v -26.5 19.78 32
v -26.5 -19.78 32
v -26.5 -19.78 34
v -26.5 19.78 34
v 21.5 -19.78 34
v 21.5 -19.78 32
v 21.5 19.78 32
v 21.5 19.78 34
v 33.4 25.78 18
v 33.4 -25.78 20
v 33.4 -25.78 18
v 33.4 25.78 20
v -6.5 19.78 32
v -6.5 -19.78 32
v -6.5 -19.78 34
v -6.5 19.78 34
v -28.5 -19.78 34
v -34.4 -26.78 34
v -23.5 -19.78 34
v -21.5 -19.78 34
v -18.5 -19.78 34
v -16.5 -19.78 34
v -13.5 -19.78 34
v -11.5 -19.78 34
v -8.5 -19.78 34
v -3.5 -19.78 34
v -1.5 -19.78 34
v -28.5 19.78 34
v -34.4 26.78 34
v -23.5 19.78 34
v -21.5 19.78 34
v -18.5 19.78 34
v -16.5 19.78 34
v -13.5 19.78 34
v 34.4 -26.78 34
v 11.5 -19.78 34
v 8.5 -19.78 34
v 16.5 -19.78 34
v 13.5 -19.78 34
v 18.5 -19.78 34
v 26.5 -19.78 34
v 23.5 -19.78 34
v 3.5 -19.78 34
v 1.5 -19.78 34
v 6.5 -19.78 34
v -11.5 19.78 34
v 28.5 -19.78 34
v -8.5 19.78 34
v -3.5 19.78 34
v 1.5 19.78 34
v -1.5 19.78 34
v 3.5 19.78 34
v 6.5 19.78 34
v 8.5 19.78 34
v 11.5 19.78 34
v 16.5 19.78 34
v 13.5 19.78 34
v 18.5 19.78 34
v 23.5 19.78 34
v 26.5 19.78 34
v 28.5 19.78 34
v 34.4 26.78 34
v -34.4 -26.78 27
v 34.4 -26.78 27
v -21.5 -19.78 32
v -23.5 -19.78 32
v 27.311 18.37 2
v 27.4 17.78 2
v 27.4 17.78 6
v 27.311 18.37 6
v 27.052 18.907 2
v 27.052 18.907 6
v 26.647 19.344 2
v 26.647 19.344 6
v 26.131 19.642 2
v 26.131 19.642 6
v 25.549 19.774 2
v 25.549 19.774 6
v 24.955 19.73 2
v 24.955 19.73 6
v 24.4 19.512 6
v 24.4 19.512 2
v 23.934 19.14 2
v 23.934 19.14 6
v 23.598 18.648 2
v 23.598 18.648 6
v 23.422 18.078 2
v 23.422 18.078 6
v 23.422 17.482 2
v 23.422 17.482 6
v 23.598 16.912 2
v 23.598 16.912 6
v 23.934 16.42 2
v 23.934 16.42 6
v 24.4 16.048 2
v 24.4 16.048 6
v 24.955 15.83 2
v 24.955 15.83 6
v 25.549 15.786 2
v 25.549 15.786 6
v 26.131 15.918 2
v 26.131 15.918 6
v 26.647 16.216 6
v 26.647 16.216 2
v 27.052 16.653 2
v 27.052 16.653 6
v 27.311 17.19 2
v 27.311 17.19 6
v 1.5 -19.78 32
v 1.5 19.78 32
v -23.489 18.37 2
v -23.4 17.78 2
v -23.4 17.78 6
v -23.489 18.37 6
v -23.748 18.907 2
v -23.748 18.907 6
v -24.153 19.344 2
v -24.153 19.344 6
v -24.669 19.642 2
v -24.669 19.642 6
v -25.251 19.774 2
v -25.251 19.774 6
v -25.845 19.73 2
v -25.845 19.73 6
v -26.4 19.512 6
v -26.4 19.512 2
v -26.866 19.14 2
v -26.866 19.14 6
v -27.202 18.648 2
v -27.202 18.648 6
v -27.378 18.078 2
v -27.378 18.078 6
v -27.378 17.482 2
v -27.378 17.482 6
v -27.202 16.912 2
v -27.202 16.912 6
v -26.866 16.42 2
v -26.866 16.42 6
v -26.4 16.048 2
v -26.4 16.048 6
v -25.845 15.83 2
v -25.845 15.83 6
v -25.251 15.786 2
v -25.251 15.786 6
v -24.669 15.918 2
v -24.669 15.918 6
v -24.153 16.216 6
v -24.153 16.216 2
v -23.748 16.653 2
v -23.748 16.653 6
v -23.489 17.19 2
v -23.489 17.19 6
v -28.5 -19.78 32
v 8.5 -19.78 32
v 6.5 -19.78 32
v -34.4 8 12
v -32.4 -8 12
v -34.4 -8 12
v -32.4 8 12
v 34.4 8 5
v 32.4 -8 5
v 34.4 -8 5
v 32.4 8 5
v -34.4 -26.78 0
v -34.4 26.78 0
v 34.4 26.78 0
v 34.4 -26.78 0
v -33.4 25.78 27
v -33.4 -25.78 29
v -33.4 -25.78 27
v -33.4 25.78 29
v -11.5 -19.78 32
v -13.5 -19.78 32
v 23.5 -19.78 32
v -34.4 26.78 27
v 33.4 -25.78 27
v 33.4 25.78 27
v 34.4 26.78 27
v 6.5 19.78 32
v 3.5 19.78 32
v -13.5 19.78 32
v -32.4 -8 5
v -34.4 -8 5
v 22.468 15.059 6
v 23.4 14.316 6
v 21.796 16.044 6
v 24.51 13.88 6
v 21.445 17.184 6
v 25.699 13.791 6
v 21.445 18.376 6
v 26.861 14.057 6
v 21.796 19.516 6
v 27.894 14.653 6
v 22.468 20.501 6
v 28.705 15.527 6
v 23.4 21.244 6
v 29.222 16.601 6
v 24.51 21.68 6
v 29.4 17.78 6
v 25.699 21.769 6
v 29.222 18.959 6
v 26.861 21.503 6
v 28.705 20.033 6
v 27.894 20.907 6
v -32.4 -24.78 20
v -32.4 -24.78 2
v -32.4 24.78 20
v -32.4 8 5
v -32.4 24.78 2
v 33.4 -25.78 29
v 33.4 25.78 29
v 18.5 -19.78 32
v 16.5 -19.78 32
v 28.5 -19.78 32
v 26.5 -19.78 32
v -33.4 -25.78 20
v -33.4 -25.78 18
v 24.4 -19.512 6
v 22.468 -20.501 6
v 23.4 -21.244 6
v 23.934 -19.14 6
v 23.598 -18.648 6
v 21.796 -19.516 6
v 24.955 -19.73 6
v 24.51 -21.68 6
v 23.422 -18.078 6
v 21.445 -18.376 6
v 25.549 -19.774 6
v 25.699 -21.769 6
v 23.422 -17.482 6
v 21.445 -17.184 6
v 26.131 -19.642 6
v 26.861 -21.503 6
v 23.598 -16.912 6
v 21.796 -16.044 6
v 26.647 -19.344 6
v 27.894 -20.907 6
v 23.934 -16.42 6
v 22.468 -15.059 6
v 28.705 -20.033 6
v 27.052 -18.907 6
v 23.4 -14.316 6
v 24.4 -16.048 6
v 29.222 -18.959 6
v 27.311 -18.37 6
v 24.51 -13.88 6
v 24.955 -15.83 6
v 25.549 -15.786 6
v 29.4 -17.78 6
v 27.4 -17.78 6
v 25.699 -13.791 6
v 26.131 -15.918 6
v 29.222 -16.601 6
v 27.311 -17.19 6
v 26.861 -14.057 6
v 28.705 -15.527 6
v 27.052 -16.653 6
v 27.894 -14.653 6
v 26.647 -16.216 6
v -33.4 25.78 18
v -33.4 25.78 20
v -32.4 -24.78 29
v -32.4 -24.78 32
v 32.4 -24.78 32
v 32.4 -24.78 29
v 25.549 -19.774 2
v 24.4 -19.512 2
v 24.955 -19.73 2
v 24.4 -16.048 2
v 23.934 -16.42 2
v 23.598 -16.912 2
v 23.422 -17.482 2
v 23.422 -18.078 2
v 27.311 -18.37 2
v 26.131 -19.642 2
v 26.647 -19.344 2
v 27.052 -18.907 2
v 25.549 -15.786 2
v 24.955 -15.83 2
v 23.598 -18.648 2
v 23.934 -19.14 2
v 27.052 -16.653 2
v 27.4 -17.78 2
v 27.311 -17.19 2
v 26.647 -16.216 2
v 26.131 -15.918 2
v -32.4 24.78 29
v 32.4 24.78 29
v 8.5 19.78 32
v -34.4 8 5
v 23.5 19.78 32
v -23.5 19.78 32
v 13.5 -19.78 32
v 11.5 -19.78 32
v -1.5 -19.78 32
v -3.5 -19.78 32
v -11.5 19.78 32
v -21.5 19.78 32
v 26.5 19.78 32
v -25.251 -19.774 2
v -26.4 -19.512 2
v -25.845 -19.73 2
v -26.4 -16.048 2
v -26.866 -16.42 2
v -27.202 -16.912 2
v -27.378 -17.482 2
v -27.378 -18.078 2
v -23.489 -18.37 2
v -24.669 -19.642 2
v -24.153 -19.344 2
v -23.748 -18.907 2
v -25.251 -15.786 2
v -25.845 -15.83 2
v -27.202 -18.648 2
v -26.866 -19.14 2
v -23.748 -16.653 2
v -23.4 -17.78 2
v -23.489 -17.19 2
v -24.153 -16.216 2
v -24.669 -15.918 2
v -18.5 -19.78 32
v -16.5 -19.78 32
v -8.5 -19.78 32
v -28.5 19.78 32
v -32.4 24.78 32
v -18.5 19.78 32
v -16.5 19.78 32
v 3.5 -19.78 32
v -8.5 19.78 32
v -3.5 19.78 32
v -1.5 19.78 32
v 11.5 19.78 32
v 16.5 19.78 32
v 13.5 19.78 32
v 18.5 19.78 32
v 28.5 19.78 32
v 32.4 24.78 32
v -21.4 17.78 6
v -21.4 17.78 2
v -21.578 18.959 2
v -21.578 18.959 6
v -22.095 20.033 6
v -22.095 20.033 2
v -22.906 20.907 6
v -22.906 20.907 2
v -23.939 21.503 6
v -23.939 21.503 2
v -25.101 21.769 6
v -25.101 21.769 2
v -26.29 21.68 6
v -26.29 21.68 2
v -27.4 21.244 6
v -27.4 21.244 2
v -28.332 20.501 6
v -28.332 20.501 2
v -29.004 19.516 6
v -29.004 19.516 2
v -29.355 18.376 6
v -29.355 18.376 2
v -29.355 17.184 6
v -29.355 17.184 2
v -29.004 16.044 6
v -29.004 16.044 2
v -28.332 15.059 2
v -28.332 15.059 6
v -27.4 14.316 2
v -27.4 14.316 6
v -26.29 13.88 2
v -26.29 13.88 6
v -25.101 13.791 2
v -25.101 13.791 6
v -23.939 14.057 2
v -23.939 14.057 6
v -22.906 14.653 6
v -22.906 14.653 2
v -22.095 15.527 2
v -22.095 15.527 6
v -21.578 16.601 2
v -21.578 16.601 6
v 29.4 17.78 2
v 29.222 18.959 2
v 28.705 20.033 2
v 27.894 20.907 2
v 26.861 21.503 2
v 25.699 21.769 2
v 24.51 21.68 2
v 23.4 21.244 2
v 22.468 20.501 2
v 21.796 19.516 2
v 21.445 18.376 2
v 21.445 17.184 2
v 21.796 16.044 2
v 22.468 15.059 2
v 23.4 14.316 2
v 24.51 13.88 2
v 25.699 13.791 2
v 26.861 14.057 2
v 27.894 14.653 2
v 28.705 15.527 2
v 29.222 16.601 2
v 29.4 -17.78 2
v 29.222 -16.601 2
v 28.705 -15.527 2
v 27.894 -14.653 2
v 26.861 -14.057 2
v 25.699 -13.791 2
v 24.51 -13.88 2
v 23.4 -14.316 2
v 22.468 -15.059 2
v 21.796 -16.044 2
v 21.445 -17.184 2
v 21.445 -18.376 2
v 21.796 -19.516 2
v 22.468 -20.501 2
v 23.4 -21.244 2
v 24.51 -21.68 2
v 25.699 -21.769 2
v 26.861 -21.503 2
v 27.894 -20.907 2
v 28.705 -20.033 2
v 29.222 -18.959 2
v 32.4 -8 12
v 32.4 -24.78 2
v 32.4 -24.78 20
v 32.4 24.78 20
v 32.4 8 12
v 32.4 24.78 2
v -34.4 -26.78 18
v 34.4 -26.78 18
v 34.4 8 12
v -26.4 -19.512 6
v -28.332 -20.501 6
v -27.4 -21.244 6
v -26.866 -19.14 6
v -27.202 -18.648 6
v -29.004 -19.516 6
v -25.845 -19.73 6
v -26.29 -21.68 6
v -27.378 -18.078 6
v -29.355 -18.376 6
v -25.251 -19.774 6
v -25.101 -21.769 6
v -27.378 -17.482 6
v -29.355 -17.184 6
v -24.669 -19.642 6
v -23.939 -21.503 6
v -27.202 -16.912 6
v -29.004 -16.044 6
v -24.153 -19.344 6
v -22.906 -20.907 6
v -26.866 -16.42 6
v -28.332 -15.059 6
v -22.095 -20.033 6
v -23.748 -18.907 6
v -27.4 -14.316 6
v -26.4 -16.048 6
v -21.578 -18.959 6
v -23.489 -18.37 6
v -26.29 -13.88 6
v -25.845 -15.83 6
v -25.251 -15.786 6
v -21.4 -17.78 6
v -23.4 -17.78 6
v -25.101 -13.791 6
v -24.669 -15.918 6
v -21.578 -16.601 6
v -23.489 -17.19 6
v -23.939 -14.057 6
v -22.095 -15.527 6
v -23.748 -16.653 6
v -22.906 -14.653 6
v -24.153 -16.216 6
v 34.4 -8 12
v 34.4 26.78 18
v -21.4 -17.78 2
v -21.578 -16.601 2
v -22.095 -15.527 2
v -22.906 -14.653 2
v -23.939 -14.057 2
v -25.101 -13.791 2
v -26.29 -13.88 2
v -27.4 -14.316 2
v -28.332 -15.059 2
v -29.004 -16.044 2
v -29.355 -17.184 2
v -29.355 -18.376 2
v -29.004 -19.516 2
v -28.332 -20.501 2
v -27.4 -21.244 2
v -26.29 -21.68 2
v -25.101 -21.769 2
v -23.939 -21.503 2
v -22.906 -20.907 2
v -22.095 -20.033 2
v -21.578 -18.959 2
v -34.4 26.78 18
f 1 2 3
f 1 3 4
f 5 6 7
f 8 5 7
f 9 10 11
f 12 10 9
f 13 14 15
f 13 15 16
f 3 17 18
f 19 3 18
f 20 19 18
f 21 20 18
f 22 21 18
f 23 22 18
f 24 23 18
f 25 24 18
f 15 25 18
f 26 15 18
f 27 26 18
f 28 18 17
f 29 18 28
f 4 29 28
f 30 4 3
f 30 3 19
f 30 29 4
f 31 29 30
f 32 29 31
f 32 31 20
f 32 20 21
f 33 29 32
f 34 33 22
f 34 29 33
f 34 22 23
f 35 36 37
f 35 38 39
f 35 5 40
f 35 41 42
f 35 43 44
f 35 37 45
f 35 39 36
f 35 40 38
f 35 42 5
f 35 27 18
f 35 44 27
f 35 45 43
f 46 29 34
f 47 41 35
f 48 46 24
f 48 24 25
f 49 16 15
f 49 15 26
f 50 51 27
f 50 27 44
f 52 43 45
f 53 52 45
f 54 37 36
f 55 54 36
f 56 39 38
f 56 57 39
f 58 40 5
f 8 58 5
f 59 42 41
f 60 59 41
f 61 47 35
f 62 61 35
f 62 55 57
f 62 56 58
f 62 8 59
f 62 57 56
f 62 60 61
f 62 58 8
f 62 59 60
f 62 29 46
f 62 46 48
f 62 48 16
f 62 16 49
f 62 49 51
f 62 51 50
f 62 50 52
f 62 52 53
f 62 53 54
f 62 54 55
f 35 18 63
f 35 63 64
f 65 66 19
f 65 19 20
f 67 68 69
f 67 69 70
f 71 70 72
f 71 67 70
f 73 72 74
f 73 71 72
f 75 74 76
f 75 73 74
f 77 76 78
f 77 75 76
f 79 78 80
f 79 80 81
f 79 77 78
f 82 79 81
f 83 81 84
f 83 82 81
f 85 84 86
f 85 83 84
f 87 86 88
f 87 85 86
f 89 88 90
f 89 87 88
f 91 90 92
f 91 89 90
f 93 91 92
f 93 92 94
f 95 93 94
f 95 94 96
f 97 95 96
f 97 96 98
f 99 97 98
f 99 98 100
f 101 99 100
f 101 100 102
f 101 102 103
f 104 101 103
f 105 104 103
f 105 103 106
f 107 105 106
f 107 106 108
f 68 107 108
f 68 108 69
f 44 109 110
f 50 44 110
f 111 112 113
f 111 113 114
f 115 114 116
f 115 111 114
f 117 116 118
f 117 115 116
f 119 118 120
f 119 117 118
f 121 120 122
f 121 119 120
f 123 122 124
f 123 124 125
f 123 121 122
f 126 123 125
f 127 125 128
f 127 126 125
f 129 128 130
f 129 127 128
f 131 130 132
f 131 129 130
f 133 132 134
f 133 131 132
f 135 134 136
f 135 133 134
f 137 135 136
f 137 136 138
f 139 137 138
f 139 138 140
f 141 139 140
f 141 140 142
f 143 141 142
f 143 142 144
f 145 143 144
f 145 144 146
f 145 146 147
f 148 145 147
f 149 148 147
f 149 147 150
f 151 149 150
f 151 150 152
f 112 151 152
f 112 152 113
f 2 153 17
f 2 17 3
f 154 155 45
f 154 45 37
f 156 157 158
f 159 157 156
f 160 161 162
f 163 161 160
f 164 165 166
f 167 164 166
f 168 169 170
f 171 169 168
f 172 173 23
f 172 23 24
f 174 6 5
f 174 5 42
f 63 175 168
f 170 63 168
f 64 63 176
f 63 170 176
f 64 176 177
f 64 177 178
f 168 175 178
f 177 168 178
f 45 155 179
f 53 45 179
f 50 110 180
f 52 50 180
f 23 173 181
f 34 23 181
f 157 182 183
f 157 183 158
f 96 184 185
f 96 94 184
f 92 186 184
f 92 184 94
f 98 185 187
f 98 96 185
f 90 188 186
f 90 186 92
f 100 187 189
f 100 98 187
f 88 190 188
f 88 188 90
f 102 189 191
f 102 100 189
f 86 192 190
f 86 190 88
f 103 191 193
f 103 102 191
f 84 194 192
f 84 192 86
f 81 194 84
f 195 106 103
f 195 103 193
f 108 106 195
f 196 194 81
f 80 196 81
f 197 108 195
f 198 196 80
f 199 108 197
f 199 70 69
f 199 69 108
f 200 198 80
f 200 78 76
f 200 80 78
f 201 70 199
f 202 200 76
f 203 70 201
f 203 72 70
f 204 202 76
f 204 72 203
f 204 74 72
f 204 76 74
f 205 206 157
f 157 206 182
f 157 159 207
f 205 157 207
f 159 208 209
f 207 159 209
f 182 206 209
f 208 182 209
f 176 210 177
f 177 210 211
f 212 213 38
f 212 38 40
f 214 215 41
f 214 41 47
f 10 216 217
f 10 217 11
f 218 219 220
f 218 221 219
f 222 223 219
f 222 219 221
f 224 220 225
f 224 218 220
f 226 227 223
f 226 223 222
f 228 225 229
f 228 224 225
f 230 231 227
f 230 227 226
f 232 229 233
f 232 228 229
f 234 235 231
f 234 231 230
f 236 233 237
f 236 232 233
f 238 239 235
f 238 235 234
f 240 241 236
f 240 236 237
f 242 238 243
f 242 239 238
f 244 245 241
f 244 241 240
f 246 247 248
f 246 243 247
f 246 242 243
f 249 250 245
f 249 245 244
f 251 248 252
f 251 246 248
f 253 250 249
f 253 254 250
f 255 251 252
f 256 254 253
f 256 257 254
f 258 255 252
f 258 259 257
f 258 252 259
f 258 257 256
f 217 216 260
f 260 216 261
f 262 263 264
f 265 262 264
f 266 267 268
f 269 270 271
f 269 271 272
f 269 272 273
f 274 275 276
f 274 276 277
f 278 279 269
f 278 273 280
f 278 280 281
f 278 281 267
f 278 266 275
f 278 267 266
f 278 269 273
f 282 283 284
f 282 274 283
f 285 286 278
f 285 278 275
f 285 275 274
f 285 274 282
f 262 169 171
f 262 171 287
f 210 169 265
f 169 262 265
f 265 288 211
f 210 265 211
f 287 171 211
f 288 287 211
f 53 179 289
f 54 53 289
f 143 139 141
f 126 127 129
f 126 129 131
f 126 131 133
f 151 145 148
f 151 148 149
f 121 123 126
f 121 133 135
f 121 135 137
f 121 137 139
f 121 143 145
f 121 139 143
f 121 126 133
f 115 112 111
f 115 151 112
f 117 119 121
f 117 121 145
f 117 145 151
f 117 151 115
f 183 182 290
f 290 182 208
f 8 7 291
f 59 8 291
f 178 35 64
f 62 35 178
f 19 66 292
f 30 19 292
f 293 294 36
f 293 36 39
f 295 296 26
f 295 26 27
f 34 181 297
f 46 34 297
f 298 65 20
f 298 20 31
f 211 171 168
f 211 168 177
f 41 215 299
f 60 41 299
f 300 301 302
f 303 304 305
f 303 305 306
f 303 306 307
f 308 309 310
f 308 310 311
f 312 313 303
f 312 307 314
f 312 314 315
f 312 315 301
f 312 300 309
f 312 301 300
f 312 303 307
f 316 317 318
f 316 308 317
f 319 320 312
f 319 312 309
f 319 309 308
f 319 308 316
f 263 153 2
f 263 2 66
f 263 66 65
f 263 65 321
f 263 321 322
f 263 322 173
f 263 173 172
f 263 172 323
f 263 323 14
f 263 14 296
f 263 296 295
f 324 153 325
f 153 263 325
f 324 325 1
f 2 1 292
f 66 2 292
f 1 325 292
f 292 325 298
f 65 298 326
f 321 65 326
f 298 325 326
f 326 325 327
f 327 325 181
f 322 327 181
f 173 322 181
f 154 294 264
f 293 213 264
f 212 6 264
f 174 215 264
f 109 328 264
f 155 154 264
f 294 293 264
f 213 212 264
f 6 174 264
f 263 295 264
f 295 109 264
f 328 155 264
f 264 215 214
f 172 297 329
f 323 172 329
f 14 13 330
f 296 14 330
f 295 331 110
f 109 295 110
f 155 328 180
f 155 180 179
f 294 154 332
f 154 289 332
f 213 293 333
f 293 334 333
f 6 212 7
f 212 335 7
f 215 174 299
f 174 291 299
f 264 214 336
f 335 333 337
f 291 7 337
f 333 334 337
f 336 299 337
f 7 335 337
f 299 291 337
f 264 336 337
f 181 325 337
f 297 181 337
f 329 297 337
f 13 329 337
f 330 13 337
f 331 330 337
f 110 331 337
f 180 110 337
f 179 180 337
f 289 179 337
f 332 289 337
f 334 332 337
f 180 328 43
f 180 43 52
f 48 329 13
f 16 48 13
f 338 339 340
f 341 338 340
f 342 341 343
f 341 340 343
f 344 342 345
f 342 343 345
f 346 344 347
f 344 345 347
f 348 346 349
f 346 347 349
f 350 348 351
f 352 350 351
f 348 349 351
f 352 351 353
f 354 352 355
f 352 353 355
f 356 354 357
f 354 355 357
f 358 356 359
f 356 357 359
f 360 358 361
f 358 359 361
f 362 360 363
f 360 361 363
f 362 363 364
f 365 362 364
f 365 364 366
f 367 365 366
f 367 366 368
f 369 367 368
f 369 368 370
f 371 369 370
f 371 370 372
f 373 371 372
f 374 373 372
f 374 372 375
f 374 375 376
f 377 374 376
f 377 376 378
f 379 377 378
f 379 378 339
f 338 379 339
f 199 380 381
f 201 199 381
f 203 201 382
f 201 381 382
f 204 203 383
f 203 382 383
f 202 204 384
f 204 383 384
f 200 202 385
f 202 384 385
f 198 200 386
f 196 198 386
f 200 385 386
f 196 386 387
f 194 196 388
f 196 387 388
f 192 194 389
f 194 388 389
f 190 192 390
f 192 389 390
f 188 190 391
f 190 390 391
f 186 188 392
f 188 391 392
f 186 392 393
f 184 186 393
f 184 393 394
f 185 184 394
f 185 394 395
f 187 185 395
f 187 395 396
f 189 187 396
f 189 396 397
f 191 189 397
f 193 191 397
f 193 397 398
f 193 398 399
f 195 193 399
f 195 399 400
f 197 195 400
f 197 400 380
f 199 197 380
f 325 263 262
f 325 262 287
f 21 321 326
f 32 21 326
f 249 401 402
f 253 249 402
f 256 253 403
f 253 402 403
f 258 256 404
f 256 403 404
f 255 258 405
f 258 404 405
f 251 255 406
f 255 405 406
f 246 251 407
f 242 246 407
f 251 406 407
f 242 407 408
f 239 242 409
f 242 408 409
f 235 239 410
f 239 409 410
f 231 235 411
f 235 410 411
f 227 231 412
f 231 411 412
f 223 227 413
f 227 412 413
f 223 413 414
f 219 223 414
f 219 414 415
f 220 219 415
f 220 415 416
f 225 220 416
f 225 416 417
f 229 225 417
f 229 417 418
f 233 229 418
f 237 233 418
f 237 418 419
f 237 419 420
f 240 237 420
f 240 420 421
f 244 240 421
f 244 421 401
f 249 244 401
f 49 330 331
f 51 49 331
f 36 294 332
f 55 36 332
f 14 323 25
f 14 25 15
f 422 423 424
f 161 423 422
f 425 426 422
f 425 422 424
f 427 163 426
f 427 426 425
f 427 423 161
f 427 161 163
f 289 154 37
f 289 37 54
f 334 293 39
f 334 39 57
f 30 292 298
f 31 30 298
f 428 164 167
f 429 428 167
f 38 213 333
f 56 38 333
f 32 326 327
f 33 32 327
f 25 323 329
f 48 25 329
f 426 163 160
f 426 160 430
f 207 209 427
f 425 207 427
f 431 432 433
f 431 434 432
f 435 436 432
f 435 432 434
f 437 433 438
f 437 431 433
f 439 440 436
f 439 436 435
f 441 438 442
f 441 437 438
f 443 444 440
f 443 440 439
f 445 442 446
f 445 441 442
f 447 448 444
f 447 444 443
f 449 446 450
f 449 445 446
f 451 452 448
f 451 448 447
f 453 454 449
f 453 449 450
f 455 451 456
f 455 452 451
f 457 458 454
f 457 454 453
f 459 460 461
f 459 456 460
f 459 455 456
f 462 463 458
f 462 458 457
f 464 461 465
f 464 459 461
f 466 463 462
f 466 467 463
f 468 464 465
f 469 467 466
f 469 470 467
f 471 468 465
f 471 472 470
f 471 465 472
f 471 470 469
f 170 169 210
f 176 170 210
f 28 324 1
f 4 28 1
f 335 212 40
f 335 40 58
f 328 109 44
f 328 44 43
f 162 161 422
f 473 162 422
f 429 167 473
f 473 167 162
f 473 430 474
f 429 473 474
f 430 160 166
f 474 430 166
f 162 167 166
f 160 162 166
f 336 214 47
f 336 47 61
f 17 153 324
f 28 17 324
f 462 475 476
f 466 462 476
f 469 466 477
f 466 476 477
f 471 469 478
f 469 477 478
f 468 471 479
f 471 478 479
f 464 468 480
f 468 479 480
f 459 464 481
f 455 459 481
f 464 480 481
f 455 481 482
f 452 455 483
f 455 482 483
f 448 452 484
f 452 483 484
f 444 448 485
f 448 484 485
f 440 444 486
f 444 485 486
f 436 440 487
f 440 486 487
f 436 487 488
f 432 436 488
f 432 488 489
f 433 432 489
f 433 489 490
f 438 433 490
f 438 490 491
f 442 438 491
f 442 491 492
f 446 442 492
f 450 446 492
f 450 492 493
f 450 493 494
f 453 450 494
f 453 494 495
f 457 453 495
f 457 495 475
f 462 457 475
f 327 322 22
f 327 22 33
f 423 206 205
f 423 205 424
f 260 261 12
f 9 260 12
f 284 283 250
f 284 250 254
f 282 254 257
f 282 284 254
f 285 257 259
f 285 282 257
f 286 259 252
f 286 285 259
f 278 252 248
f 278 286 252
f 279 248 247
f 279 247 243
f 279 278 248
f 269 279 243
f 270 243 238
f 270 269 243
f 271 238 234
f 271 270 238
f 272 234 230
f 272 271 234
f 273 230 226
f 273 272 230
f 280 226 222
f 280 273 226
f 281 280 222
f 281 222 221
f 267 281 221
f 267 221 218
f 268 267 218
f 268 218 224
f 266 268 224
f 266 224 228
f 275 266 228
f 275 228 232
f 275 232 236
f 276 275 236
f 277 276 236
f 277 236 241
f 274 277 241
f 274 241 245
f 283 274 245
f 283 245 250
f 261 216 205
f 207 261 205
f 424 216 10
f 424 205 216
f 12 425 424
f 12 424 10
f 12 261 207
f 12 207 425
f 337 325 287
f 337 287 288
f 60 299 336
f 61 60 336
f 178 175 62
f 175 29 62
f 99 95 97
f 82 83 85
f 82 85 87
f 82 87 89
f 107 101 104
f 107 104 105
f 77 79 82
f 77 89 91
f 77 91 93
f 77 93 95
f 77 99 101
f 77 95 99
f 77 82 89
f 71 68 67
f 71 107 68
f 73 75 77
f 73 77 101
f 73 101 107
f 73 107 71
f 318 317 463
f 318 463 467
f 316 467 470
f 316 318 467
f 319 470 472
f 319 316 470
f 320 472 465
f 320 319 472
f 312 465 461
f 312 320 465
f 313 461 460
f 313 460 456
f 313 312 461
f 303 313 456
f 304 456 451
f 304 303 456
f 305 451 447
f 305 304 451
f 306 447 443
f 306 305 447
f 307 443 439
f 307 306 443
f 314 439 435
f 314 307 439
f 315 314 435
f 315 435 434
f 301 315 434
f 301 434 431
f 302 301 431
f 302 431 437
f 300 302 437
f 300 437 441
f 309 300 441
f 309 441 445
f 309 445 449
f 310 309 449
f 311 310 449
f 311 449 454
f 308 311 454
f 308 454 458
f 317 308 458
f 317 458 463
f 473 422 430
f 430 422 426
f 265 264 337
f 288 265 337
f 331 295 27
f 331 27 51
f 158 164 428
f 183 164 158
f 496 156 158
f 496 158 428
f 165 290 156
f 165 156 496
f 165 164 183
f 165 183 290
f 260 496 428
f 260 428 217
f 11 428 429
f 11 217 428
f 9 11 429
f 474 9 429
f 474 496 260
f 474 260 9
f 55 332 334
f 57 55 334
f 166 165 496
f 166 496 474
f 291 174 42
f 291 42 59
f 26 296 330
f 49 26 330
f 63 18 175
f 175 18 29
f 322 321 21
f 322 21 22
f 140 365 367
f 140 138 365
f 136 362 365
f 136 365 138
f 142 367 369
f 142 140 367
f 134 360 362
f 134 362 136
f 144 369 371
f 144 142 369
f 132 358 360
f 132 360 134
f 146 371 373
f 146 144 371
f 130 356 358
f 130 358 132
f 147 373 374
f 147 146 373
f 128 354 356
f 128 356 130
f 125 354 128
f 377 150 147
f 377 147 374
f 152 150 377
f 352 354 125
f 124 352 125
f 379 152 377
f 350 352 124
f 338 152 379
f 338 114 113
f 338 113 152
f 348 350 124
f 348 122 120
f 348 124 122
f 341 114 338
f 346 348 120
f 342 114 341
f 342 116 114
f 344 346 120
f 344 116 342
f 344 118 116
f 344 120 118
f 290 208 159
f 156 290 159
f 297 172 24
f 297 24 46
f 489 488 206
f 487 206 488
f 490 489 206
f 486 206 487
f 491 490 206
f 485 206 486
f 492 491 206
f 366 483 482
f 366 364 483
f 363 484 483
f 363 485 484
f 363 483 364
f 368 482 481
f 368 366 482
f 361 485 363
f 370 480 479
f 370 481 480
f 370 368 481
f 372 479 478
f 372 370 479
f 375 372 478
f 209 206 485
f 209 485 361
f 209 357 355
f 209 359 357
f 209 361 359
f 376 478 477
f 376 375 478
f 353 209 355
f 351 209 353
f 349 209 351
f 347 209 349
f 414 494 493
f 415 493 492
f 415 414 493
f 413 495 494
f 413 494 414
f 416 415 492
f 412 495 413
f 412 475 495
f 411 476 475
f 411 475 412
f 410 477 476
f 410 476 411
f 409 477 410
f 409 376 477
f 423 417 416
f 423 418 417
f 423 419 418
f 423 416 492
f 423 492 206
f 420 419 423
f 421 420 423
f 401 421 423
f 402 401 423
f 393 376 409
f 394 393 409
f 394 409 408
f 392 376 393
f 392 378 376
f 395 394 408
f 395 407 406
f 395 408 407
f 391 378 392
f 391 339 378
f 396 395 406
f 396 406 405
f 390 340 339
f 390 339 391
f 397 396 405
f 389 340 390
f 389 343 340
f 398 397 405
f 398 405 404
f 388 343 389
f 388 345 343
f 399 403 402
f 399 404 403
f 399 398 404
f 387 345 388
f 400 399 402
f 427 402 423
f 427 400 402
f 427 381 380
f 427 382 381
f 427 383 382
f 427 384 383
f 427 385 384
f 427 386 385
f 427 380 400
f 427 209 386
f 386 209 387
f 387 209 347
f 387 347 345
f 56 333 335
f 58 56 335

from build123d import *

# Parameters (mm, degrees)
F0_W          = 64.8
F0_H          = 49.56
F0_R          = 4
F1_DEPTH      = 2
F0_R_2        = 2
F2_DEPTH      = 6
F3_DEPTH      = 2
F0_W_2        = 68.8
F0_H_2        = 53.56
F4_DEPTH      = 20
F5_W          = 68.8
F5_H          = 53.56
F5_W_2        = 66.8
F5_H_2        = 51.56
F6_DEPTH      = 2
F7_W          = 16
F7_H          = 7
F8_DEPTH      = 40
F8_DEPTH_BACK = 40
F10_W         = 68.8
F10_H         = 53.56
F10_W_2       = 66.8
F10_H_2       = 51.56
F10_W_3       = 64.8
F10_H_3       = 49.56
F10_W_4       = 2
F10_H_4       = 39.56
F11_DEPTH     = 2
F12_DEPTH     = 5
F13_DEPTH     = 3


with BuildPart() as f1:
    # F0 (on Top) → F1 (new body)
    with BuildSketch(Plane.XY):
        Rectangle(F0_W, F0_H)
        with Locations((-25.4, -17.78)):
            Circle(F0_R, mode=Mode.SUBTRACT)
        with Locations((25.4, -17.78)):
            Circle(F0_R, mode=Mode.SUBTRACT)
        with Locations((-25.4, 17.78)):
            Circle(F0_R, mode=Mode.SUBTRACT)
        with Locations((25.4, 17.78)):
            Circle(F0_R, mode=Mode.SUBTRACT)
    extrude(amount=F1_DEPTH)

    # F0 (on Top) → F2 (join)
    with BuildSketch(Plane.XY):
        with Locations((-25.4, 17.78)):
            Circle(F0_R)
        with Locations((-25.4, 17.78)):
            Circle(F0_R_2, mode=Mode.SUBTRACT)
        with Locations((25.4, 17.78)):
            Circle(F0_R)
        with Locations((25.4, 17.78)):
            Circle(F0_R_2, mode=Mode.SUBTRACT)
        with Locations((25.4, -17.78)):
            Circle(F0_R)
        with Locations((25.4, -17.78)):
            Circle(F0_R_2, mode=Mode.SUBTRACT)
        with Locations((-25.4, -17.78)):
            Circle(F0_R)
        with Locations((-25.4, -17.78)):
            Circle(F0_R_2, mode=Mode.SUBTRACT)
    extrude(amount=F2_DEPTH)

    # F0 (on Top) → F3 (join)
    with BuildSketch(Plane.XY):
        with Locations((-25.4, 17.78)):
            Circle(F0_R_2)
        with Locations((-25.4, -17.78)):
            Circle(F0_R_2)
        with Locations((25.4, -17.78)):
            Circle(F0_R_2)
        with Locations((25.4, 17.78)):
            Circle(F0_R_2)
    extrude(amount=F3_DEPTH)

    # F0 (on Top) → F4 (join)
    with BuildSketch(Plane.XY):
        Rectangle(F0_W_2, F0_H_2)
        Rectangle(F0_W, F0_H, mode=Mode.SUBTRACT)
    extrude(amount=F4_DEPTH)

    # F5 (on face) → F6 (cut)
    with BuildSketch(Plane.XY.offset(20)):
        Rectangle(F5_W, F5_H)
        Rectangle(F5_W_2, F5_H_2, mode=Mode.SUBTRACT)
    extrude(amount=-F6_DEPTH, mode=Mode.SUBTRACT)

    # F7 (on Right) → F8 (cut, two sides)
    with BuildSketch(Plane.YZ) as f8_sk:
        with Locations((0, 8.5)):
            Rectangle(F7_W, F7_H)
    extrude(amount=-F8_DEPTH, mode=Mode.SUBTRACT)
    extrude(f8_sk.sketch, amount=F8_DEPTH_BACK, mode=Mode.SUBTRACT)


with BuildPart() as f11:
    # F10 (on offset) → F11 (new body)
    with BuildSketch(Plane.XY.offset(32)):
        Rectangle(F10_W, F10_H)
        Rectangle(F10_W_2, F10_H_2, mode=Mode.SUBTRACT)
        Rectangle(F10_W_2, F10_H_2)
        Rectangle(F10_W_3, F10_H_3, mode=Mode.SUBTRACT)
        Rectangle(F10_W_3, F10_H_3)
        with Locations((-27.5, 0)):
            Rectangle(F10_W_4, F10_H_4, mode=Mode.SUBTRACT)
        with Locations((-22.5, 0)):
            Rectangle(F10_W_4, F10_H_4, mode=Mode.SUBTRACT)
        with Locations((-17.5, 0)):
            Rectangle(F10_W_4, F10_H_4, mode=Mode.SUBTRACT)
        with Locations((-12.5, 0)):
            Rectangle(F10_W_4, F10_H_4, mode=Mode.SUBTRACT)
        with Locations((-7.5, 0)):
            Rectangle(F10_W_4, F10_H_4, mode=Mode.SUBTRACT)
        with Locations((-2.5, 0)):
            Rectangle(F10_W_4, F10_H_4, mode=Mode.SUBTRACT)
        with Locations((2.5, 0)):
            Rectangle(F10_W_4, F10_H_4, mode=Mode.SUBTRACT)
        with Locations((7.5, 0)):
            Rectangle(F10_W_4, F10_H_4, mode=Mode.SUBTRACT)
        with Locations((12.5, 0)):
            Rectangle(F10_W_4, F10_H_4, mode=Mode.SUBTRACT)
        with Locations((17.5, 0)):
            Rectangle(F10_W_4, F10_H_4, mode=Mode.SUBTRACT)
        with Locations((22.5, 0)):
            Rectangle(F10_W_4, F10_H_4, mode=Mode.SUBTRACT)
        with Locations((27.5, 0)):
            Rectangle(F10_W_4, F10_H_4, mode=Mode.SUBTRACT)
    extrude(amount=F11_DEPTH)

    # F10 (on offset) → F12 (join)
    with BuildSketch(Plane.XY.offset(32)):
        Rectangle(F10_W, F10_H)
        Rectangle(F10_W_2, F10_H_2, mode=Mode.SUBTRACT)
    extrude(amount=-F12_DEPTH)

    # F10 (on offset) → F13 (join)
    with BuildSketch(Plane.XY.offset(32)):
        Rectangle(F10_W_2, F10_H_2)
        Rectangle(F10_W_3, F10_H_3, mode=Mode.SUBTRACT)
    extrude(amount=-F13_DEPTH)


solid = Compound([f1.part, f11.part])
